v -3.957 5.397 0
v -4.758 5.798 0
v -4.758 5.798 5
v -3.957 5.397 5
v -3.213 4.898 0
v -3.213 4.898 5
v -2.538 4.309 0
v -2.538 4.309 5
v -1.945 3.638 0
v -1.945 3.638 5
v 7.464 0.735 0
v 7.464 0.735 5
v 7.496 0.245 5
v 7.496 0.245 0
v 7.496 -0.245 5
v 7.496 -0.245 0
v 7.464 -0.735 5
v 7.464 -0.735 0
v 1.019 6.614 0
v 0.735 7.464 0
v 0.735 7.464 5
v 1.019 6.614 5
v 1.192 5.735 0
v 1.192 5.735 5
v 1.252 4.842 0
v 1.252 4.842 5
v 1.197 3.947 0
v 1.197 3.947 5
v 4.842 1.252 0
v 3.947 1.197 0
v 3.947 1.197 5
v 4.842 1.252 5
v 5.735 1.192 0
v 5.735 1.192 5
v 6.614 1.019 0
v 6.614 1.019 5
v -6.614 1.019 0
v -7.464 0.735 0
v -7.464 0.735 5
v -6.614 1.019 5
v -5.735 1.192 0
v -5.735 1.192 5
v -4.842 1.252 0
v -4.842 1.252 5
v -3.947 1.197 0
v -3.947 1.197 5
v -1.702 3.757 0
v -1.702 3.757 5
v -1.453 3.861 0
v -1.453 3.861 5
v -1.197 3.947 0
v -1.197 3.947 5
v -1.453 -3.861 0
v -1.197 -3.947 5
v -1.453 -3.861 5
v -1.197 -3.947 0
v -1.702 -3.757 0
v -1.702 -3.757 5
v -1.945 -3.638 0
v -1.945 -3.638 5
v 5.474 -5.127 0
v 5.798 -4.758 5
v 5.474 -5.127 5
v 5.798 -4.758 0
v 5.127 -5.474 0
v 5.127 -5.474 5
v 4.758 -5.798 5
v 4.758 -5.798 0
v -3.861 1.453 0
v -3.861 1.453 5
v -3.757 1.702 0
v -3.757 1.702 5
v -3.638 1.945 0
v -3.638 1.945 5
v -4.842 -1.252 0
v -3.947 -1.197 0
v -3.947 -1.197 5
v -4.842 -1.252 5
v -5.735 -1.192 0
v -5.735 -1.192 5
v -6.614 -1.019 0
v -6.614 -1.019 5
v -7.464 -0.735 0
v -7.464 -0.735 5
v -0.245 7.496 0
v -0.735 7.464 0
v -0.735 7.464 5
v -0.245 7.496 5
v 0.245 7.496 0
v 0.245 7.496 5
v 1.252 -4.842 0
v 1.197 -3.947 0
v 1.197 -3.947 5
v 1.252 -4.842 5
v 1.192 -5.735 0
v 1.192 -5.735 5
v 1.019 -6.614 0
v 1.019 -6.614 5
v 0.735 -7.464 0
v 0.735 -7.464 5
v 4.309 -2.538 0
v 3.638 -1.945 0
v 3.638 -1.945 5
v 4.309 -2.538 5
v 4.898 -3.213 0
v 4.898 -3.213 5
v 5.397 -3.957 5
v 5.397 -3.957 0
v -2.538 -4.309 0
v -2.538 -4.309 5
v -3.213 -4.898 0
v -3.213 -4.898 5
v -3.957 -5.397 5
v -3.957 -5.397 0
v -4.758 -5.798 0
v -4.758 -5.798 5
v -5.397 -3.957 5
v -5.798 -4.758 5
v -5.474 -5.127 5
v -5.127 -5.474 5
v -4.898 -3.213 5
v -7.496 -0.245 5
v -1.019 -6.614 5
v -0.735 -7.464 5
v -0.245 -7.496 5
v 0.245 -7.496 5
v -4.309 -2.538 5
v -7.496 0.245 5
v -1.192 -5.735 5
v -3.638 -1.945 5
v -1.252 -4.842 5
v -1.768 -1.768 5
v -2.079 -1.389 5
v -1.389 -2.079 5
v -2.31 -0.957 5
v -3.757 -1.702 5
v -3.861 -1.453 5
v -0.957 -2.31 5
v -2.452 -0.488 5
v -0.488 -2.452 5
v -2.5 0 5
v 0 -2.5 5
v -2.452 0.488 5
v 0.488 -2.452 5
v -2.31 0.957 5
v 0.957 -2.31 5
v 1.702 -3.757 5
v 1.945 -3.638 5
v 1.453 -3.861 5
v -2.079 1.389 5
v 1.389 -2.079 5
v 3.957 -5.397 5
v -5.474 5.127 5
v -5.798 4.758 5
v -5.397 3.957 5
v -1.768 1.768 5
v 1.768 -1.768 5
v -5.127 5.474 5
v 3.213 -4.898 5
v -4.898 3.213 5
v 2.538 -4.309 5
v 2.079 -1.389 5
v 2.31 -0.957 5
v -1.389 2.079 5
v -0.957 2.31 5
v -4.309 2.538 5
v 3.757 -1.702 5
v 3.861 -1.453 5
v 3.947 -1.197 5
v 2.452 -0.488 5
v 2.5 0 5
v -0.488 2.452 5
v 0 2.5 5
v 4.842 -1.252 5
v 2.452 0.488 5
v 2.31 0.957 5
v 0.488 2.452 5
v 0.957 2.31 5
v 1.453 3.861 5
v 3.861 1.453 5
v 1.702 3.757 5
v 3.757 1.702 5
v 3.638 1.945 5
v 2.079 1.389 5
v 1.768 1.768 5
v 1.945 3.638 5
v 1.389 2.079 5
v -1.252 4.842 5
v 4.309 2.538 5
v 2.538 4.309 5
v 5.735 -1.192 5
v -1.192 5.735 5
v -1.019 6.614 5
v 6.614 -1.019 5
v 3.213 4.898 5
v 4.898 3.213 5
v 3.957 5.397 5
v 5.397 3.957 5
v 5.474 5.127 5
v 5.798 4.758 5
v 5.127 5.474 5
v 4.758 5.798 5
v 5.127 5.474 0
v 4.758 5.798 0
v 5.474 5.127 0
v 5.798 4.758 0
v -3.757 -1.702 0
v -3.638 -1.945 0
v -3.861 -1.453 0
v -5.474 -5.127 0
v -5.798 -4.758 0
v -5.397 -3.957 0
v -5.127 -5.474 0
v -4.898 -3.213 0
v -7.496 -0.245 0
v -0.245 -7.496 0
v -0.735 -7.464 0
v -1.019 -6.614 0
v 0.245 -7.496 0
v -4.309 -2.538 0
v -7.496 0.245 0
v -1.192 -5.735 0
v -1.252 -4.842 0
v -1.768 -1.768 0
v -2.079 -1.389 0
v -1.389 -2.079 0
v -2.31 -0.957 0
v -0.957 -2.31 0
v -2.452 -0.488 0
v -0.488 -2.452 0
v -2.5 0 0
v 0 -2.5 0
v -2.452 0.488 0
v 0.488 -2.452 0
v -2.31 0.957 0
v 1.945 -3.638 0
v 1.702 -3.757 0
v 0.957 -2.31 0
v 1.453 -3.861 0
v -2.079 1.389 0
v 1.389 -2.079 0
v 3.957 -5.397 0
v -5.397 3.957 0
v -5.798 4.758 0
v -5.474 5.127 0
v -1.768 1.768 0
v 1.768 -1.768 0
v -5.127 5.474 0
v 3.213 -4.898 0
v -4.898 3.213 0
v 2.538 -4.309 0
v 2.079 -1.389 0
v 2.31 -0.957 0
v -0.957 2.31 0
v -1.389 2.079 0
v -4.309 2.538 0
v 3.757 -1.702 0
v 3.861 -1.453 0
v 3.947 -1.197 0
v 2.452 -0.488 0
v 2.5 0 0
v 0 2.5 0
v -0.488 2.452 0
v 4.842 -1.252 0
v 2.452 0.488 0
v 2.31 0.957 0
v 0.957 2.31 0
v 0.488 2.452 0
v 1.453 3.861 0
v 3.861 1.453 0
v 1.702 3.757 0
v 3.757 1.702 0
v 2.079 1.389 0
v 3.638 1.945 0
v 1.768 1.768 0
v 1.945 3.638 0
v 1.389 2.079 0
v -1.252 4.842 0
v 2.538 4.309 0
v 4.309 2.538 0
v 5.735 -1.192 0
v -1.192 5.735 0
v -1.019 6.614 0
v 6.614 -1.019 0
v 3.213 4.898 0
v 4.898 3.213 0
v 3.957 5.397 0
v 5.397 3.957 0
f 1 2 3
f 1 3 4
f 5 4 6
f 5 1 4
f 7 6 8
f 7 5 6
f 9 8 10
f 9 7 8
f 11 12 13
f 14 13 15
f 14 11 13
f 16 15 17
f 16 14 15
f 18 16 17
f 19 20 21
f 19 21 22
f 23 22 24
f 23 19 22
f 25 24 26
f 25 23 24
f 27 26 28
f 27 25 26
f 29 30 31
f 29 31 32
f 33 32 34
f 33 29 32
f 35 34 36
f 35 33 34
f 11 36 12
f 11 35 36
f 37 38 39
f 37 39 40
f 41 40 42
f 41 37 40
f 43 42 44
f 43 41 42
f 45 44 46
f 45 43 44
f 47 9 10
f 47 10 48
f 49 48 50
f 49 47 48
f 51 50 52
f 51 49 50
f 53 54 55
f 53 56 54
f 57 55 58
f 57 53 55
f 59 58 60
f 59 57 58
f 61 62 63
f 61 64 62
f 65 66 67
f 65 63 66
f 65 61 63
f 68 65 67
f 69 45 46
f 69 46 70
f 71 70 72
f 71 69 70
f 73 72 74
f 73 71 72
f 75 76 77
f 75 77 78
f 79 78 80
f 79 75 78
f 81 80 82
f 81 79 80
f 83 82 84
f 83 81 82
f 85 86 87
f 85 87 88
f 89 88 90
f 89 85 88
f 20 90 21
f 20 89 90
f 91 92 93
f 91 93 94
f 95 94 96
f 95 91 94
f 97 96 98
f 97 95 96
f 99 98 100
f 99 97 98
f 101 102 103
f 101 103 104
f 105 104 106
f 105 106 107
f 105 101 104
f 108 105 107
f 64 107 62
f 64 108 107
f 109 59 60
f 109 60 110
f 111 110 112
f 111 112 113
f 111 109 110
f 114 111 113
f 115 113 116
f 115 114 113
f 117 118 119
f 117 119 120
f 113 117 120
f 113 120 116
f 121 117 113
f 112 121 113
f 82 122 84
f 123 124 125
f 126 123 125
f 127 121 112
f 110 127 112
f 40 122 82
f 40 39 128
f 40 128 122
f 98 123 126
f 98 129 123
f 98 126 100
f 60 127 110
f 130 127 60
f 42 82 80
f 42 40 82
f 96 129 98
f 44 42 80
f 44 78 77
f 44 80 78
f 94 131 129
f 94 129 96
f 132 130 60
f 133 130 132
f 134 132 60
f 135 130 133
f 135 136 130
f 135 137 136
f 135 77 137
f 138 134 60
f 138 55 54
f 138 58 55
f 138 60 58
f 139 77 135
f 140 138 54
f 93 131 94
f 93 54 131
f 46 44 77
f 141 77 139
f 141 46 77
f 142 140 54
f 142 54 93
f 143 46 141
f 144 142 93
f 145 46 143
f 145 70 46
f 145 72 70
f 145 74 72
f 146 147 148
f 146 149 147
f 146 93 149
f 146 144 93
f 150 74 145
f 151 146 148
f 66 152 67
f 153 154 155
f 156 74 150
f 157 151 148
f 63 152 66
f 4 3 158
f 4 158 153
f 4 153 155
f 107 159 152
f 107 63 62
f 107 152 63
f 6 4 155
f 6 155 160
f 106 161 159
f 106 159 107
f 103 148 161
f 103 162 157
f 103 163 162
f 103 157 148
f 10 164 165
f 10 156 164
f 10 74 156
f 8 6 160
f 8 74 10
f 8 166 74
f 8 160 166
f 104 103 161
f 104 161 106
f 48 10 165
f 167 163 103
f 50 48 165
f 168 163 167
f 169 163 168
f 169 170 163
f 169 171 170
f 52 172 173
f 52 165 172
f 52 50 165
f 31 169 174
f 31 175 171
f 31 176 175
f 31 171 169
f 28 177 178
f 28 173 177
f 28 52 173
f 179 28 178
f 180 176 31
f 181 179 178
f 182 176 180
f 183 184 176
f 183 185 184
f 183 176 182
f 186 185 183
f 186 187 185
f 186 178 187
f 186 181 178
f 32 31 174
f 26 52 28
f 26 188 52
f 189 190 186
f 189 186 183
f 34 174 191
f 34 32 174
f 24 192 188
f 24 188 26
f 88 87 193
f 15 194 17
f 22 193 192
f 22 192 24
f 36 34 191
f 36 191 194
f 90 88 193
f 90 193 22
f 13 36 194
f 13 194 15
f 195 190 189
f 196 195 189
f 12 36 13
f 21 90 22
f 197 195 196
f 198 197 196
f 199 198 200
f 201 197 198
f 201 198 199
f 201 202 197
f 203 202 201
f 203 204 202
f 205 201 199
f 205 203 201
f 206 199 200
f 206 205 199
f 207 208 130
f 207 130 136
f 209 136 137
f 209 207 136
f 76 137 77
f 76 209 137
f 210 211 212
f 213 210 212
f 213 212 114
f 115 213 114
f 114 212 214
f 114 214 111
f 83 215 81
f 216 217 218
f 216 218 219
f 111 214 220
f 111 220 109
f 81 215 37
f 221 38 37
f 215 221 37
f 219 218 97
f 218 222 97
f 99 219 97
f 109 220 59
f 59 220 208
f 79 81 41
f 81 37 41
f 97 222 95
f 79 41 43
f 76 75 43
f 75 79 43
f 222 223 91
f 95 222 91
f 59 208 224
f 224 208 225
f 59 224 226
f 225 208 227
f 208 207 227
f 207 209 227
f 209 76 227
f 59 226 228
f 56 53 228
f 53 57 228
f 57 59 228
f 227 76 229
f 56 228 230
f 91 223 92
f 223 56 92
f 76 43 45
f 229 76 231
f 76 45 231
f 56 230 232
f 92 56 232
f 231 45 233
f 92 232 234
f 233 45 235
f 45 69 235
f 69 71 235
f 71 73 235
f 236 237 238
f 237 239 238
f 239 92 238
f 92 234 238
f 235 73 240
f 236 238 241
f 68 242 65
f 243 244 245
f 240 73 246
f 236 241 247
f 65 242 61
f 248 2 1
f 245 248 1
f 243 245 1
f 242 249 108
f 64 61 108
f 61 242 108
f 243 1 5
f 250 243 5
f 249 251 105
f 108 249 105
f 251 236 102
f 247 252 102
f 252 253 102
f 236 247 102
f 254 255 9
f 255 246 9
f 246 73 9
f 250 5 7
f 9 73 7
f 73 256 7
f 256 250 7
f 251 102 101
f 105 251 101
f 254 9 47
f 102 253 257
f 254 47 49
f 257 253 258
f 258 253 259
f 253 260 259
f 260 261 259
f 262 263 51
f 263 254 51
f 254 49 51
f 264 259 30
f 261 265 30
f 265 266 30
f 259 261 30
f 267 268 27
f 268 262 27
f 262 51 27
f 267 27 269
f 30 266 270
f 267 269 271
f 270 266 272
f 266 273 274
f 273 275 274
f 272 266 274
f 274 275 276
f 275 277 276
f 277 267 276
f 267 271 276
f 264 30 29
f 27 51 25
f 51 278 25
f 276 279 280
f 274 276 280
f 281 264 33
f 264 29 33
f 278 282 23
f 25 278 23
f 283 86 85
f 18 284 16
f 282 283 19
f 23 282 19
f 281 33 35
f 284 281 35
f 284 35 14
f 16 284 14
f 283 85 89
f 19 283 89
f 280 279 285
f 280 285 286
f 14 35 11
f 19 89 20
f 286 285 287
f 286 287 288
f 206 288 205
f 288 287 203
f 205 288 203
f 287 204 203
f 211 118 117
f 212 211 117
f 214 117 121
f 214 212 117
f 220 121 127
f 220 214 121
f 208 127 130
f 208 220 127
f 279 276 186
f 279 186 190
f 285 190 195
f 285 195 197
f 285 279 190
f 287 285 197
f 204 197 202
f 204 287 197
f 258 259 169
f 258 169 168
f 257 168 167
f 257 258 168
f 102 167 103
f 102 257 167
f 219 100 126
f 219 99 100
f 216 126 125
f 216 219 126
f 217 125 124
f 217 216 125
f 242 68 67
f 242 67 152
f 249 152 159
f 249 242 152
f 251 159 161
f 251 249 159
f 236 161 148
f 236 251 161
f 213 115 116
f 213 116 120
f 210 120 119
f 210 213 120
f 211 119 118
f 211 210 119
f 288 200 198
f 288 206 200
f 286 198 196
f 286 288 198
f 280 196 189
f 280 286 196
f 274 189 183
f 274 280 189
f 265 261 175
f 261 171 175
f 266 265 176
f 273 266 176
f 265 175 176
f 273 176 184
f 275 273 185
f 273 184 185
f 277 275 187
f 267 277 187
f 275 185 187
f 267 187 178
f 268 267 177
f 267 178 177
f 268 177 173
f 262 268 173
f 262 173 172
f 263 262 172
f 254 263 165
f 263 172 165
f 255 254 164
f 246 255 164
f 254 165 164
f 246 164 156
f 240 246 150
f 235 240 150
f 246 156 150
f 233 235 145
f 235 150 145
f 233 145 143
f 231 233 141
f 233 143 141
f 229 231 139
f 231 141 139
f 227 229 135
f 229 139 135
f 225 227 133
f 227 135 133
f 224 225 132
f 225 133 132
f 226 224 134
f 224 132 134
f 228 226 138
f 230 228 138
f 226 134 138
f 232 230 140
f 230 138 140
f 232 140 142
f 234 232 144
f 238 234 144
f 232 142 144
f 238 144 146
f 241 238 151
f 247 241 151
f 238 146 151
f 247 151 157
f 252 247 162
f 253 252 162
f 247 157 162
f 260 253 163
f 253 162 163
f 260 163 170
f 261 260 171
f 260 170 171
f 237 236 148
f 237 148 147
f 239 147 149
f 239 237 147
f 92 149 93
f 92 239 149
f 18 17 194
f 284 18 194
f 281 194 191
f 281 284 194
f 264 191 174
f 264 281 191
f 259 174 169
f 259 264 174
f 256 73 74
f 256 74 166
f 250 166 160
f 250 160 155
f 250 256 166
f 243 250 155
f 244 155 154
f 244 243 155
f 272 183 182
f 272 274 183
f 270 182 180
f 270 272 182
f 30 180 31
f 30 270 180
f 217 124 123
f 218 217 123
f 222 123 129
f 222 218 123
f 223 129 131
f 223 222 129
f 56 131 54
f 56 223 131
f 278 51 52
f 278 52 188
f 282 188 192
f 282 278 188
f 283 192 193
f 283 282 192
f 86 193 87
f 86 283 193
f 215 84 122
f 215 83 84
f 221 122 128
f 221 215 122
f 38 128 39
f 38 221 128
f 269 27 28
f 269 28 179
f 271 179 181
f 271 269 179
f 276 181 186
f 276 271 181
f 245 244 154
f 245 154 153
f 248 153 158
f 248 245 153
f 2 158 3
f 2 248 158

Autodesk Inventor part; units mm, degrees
sketch "Sketch1" plane through (0, 0, 0) normal (0, 0, 1) x (1, 0, 0)
  circle A0 centre (0, 0) radius 7.5
  dimension "d0" = 15
extrude "Extrusion1" add sketch "Sketch1" along normal blind 5
ref_plane "Work Plane2" through (0, 0, 2.5) normal (0, 0, 1) x (1, 0, 0)
sketch "Sketch2" plane through (0, 0, 0) normal (0, 0, -1) x (-1, 0, 0)
  circle A0 centre (0, 0) radius 7.5 projected
  circle A1 centre (0, 0) radius 6
  dimension "d3" = 12
surface extrude "Pitch Diameter" sketch "Sketch2" against normal through all shown no curves A1
ref_plane "Work Plane8" through (0, 0, 0) normal (0.9238795, 0.3826834, 0) x (0, 0, 1)
ref_plane "Work Plane9" through (0, 0, 0) normal (1, 0, 0) x (0, 1, 0)
spur gear teeth "Spur Gear" teeth 8 pitch diameter 12 tip diameter 15 root diameter 8.25 face width 5 start plane through (0, 0, 0) normal (0, 0, -1) x (-1, 0, 0)
sketch "Sketch3" plane through (0, 0, 5) normal (0, 0, 1) x (1, 0, 0)
  circle A0 centre (0, 0) radius 2.5
  dimension "d49" = 5
extrude "Extrusion2" cut sketch "Sketch3" against normal up to surface (5 mm away)
equation "\"d0\" = da_da"
equation "\"d1\" = da_b"
equation "\"d3\" = da_d"
equation "\"d16\" = da_aw"
equation "\"d43\" = da_aw"
equation "\"d46\" = da_aw"
equation "\"da_da\" = 15"
equation "\"da_b\" = 5"
equation "\"da_d\" = 12"
equation "\"da_aw\" = 13.5"
properties part number "Spur Gear1" material "Steel"
